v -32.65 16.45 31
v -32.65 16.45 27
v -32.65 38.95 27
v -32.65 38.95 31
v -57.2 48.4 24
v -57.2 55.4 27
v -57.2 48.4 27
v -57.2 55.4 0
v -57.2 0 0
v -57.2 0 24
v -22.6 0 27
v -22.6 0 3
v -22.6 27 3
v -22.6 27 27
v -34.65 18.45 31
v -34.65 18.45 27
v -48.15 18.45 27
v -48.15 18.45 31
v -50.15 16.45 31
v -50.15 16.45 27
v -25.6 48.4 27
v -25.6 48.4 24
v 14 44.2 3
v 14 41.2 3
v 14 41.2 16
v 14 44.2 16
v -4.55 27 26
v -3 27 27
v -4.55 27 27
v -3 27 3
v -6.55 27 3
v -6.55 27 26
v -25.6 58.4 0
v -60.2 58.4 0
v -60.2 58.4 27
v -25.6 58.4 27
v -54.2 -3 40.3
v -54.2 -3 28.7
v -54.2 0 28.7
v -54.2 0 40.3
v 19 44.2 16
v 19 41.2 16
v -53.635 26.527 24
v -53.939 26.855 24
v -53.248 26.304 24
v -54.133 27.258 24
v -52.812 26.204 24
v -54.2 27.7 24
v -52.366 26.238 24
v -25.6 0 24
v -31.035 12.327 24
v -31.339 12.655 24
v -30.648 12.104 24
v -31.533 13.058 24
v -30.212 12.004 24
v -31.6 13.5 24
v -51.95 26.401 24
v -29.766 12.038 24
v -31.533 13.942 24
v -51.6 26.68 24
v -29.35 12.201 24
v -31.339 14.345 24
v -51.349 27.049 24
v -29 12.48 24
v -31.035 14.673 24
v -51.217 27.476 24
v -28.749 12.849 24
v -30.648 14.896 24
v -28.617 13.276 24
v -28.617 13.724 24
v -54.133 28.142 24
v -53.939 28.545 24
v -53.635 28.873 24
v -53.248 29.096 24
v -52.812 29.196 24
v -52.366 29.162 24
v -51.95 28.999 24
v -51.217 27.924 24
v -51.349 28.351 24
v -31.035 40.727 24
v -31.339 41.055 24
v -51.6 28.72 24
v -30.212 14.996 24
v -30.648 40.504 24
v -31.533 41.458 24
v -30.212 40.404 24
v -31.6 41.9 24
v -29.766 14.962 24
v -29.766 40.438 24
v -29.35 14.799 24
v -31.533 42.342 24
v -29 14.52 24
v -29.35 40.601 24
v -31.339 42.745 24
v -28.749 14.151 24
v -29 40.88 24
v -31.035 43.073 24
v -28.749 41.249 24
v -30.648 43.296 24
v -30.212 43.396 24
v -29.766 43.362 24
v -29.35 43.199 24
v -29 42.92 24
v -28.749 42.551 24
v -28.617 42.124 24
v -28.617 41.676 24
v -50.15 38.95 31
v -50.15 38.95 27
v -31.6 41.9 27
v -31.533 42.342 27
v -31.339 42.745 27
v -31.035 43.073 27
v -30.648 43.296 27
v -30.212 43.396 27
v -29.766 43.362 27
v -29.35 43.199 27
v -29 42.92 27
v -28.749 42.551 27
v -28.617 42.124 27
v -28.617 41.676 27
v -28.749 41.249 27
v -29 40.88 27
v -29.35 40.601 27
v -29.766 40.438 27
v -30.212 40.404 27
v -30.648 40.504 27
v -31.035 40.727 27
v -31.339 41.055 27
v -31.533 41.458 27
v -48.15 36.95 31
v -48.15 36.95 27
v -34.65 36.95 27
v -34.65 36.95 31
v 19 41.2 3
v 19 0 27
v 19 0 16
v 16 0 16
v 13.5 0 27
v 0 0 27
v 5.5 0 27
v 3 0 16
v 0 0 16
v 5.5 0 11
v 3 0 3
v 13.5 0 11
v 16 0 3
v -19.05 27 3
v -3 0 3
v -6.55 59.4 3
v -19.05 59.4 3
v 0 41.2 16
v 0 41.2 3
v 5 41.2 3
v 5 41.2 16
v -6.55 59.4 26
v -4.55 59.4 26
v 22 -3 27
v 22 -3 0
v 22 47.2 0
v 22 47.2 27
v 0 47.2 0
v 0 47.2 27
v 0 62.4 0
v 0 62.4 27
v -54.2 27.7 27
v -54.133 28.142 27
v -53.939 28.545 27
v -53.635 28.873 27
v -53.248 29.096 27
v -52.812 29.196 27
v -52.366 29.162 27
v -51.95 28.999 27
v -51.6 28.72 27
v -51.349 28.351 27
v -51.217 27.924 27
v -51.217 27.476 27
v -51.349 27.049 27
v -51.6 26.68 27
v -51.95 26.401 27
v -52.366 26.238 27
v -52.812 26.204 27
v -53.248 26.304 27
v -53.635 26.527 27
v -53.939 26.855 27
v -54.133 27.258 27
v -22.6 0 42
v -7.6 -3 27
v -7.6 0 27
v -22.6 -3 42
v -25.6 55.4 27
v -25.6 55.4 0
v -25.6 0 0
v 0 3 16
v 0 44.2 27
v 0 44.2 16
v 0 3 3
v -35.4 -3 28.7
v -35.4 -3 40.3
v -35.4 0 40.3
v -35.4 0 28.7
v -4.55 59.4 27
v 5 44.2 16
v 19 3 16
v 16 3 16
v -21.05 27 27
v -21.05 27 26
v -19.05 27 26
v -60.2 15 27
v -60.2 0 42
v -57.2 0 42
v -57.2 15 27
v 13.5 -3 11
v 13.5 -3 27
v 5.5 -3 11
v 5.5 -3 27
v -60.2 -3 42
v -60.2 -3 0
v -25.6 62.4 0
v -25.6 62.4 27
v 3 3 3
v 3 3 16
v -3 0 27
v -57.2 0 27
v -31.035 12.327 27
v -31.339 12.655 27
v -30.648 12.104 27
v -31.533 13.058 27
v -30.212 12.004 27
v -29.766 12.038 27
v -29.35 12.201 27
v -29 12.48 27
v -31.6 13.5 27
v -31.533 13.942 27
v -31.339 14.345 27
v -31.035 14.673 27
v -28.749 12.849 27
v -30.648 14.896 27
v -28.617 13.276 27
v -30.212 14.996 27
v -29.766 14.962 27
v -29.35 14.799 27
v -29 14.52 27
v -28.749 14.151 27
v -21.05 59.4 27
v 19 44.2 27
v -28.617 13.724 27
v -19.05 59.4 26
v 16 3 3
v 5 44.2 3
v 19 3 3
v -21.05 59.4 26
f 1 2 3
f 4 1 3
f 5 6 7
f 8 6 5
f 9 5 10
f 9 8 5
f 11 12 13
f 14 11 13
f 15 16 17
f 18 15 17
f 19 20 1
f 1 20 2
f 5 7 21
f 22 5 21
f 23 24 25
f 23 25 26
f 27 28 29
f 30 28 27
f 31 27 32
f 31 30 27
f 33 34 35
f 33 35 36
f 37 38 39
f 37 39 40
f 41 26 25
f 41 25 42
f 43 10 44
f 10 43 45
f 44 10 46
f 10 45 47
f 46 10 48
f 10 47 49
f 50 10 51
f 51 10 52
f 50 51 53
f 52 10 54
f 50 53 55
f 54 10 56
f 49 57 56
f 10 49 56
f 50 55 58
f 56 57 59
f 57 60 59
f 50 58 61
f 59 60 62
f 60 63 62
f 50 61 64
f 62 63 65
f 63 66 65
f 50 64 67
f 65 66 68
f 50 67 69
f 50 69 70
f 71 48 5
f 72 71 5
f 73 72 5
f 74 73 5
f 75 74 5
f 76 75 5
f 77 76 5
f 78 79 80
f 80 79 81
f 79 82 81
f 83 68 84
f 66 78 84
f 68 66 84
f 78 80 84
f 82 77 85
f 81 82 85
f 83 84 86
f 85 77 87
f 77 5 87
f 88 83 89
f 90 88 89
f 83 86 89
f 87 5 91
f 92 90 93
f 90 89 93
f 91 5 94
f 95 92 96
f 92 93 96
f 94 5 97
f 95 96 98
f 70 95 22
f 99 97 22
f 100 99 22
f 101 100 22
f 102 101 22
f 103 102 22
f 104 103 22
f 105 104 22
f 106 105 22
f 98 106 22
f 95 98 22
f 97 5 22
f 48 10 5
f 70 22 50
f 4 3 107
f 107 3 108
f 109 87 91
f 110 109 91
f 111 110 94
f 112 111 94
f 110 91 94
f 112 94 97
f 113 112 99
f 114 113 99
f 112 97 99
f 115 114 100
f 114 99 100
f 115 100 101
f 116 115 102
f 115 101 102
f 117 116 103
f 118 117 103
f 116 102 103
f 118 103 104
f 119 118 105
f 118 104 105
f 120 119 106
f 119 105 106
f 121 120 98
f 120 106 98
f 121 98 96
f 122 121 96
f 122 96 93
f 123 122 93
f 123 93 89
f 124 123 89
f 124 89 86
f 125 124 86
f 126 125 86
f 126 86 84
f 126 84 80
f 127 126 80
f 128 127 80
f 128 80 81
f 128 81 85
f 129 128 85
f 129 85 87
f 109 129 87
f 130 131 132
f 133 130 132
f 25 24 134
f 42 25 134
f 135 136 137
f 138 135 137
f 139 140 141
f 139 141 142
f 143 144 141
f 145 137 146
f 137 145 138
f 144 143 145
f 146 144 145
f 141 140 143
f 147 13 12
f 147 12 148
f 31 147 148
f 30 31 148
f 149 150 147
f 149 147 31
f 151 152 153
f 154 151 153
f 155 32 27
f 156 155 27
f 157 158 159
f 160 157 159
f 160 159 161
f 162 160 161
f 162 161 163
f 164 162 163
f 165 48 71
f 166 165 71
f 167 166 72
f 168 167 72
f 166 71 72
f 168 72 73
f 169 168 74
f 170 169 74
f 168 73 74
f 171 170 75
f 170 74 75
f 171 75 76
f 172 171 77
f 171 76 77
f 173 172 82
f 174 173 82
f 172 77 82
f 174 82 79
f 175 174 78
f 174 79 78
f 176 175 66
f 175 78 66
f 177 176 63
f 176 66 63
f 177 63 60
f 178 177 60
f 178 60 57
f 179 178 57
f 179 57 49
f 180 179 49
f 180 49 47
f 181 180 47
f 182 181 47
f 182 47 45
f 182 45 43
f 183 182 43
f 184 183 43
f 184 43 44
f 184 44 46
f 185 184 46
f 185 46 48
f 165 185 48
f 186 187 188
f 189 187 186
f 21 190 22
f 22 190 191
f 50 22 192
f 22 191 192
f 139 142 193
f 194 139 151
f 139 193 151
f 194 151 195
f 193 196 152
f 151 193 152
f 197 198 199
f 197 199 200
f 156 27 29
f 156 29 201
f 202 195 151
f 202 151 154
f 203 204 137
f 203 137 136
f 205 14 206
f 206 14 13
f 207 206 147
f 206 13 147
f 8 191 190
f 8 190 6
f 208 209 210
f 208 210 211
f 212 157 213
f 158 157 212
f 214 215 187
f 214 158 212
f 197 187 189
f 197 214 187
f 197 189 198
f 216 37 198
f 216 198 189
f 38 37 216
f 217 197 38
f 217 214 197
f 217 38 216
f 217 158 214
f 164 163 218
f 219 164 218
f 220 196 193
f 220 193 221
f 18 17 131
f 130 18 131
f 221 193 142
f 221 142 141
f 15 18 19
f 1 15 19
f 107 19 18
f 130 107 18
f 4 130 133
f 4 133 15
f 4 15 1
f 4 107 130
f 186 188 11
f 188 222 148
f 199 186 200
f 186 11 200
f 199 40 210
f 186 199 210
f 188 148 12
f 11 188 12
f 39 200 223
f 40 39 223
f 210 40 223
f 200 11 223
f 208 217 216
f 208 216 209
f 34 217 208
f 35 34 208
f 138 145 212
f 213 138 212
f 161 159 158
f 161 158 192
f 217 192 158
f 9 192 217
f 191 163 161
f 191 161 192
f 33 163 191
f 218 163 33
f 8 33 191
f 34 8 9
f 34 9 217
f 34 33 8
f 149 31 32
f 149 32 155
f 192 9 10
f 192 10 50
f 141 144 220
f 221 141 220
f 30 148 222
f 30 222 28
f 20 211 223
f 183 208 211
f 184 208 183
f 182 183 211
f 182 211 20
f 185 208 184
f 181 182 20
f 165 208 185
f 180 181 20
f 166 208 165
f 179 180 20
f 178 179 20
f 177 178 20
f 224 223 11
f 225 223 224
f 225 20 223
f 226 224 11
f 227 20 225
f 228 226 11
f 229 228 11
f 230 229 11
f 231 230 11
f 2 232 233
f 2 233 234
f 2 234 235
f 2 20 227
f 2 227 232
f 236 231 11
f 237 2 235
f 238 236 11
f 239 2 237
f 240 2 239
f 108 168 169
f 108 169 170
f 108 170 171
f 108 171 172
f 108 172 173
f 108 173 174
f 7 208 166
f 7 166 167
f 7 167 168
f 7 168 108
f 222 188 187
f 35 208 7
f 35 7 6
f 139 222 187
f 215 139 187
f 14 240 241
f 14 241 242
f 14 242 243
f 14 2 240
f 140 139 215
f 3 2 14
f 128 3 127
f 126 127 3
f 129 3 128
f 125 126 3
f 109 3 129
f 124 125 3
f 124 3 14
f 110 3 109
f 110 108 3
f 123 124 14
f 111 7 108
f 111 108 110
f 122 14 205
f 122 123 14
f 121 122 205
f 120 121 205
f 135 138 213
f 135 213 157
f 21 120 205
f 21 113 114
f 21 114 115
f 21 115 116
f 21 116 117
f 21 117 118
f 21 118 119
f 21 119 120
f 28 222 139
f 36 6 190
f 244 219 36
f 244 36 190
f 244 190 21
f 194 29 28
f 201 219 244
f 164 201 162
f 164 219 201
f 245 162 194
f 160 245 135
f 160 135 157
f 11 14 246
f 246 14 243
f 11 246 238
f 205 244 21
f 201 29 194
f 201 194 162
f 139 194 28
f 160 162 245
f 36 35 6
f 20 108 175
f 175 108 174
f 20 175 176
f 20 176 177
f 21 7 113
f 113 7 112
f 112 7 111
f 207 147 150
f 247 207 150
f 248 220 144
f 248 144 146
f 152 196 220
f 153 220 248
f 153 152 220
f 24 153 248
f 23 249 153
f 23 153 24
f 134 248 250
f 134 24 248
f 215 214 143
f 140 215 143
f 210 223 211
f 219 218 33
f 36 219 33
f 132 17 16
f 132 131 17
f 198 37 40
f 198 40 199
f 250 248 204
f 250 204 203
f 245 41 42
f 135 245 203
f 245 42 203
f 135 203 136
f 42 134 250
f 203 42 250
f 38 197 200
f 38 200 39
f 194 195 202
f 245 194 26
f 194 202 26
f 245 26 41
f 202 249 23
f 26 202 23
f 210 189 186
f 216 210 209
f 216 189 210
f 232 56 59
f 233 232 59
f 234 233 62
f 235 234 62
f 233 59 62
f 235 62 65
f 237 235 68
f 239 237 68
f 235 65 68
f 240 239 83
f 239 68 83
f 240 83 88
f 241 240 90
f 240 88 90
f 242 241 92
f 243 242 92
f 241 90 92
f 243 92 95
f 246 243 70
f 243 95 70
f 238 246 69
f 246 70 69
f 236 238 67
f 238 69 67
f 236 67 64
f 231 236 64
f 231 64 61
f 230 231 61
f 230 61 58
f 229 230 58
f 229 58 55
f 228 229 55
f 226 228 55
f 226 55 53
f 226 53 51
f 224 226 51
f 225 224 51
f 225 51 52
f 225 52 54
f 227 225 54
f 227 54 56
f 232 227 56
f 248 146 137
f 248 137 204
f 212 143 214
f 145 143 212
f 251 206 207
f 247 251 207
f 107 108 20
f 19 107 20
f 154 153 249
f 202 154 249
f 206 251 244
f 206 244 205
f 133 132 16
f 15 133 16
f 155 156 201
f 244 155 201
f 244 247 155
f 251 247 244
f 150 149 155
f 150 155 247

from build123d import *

# Parameters (mm, degrees)
SKETCH1_W            = 2
SKETCH1_H            = 32.4
SKETCH1_W_2          = 5
SKETCH1_H_2          = 3
SKETCH1_W_3          = 3
SKETCH1_W_4          = 8
BOSS_EXTRUDE1_DEPTH  = 3
BOSS_EXTRUDE2_DEPTH  = 27
SKETCH1_4_W          = 5
SKETCH1_4_H          = 3
SKETCH1_4_W_2        = 3
BOSS_EXTRUDE3_DEPTH  = 16
SKETCH1_5_W          = 8
SKETCH1_5_H          = 3
BOSS_EXTRUDE4_DEPTH  = 11
SKETCH1_6_W          = 2
SKETCH1_6_H          = 32.4
BOSS_EXTRUDE5_DEPTH  = 26
BOSS_EXTRUDE6_DEPTH  = 27
SKETCH3_W            = 31.6
SKETCH3_H            = 48.4
BOSS_EXTRUDE7_DEPTH  = 3
BOSS_EXTRUDE8_DEPTH  = 3
BOSS_EXTRUDE9_DEPTH  = 3
SKETCH6_R            = 1.5
CUT_EXTRUDE1_DEPTH   = 10
SKETCH7_W            = 2
SKETCH7_H            = 9.25
BOSS_EXTRUDE10_DEPTH = 4


with BuildPart() as part:
    # Sketch1 → Boss-Extrude1 (new body)
    with BuildSketch(Plane.XY):
        Polygon((3, 0), (0, 0), (-3, 0), (-22.6, 0), (-22.6, 27), (-25.6, 27), (-25.6, -3), (0, -3), (5.5, -3), (5.5, 0), align=None)
        Polygon((0, 62.4), (0, 47.2), (0, 44.2), (0, 41.2), (0, 3), (0, 0), (-3, 0), (-3, 27), (-4.55, 27), (-4.55, 59.4), (-21.05, 59.4), (-21.05, 27), (-22.6, 27), (-25.6, 27), (-25.6, 59.4), (-25.6, 62.4), (-4.55, 62.4), align=None)
        with Locations((-20.05, 43.2)):
            Rectangle(SKETCH1_W, SKETCH1_H)
        Polygon((-22.6, 0), (-3, 0), (-3, 27), (-4.55, 27), (-6.55, 27), (-6.55, 59.4), (-19.05, 59.4), (-19.05, 27), (-21.05, 27), (-22.6, 27), align=None)
        with Locations((2.5, 42.7)):
            Rectangle(SKETCH1_W_2, SKETCH1_H_2)
        Polygon((0, 47.2), (0, 44.2), (5, 44.2), (14, 44.2), (19, 44.2), (19, 41.2), (19, 3), (19, 0), (22, 0), (22, 44.2), (22, 47.2), align=None)
        with Locations((16.5, 42.7)):
            Rectangle(SKETCH1_W_2, SKETCH1_H_2)
        Polygon((3, 3), (3, 0), (5.5, 0), (13.5, 0), (16, 0), (16, 3), (19, 3), (19, 41.2), (14, 41.2), (14, 44.2), (5, 44.2), (5, 41.2), (0, 41.2), (0, 3), align=None)
        with Locations((17.5, 1.5)):
            Rectangle(SKETCH1_W_3, SKETCH1_H_2)
        Polygon((16, 0), (13.5, 0), (13.5, -3), (22, -3), (22, 0), (19, 0), align=None)
        with Locations((1.5, 1.5)):
            Rectangle(SKETCH1_W_3, SKETCH1_H_2)
        with Locations((9.5, -1.5)):
            Rectangle(SKETCH1_W_4, SKETCH1_H_2)
        with Locations((-5.55, 43.2)):
            Rectangle(SKETCH1_W, SKETCH1_H)
    extrude(amount=BOSS_EXTRUDE1_DEPTH)

    # Sketch1<3> → Boss-Extrude2 (add)
    with BuildSketch(Plane.XY):
        Polygon((0, 62.4), (0, 47.2), (0, 44.2), (0, 41.2), (0, 3), (0, 0), (-3, 0), (-3, 27), (-4.55, 27), (-4.55, 59.4), (-21.05, 59.4), (-21.05, 27), (-22.6, 27), (-25.6, 27), (-25.6, 59.4), (-25.6, 62.4), (-4.55, 62.4), align=None)
        Polygon((3, 0), (0, 0), (-3, 0), (-22.6, 0), (-22.6, 27), (-25.6, 27), (-25.6, -3), (0, -3), (5.5, -3), (5.5, 0), align=None)
        Polygon((16, 0), (13.5, 0), (13.5, -3), (22, -3), (22, 0), (19, 0), align=None)
        Polygon((0, 47.2), (0, 44.2), (5, 44.2), (14, 44.2), (19, 44.2), (19, 41.2), (19, 3), (19, 0), (22, 0), (22, 44.2), (22, 47.2), align=None)
    extrude(amount=BOSS_EXTRUDE2_DEPTH)

    # Sketch1<4> → Boss-Extrude3 (add)
    with BuildSketch(Plane.XY):
        with Locations((2.5, 42.7)):
            Rectangle(SKETCH1_4_W, SKETCH1_4_H)
        with Locations((16.5, 42.7)):
            Rectangle(SKETCH1_4_W, SKETCH1_4_H)
        with Locations((17.5, 1.5)):
            Rectangle(SKETCH1_4_W_2, SKETCH1_4_H)
        with Locations((1.5, 1.5)):
            Rectangle(SKETCH1_4_W_2, SKETCH1_4_H)
    extrude(amount=BOSS_EXTRUDE3_DEPTH)

    # Sketch1<5> → Boss-Extrude4 (add)
    with BuildSketch(Plane.XY):
        with Locations((9.5, -1.5)):
            Rectangle(SKETCH1_5_W, SKETCH1_5_H)
    extrude(amount=BOSS_EXTRUDE4_DEPTH)

    # Sketch1<6> → Boss-Extrude5 (add)
    with BuildSketch(Plane.XY):
        with Locations((-5.55, 43.2)):
            Rectangle(SKETCH1_6_W, SKETCH1_6_H)
        with Locations((-20.05, 43.2)):
            Rectangle(SKETCH1_6_W, SKETCH1_6_H)
    extrude(amount=BOSS_EXTRUDE5_DEPTH)

    # Sketch2 → Boss-Extrude6 (add)
    with BuildSketch(Plane(origin=(0, 0, 0), x_dir=(-1, 0, 0), z_dir=(0, 0, -1))):
        Polygon((25.6, 0), (25.6, -3), (60.2, -3), (60.2, 58.4), (25.6, 58.4), (25.6, 55.4), (57.2, 55.4), (57.2, 48.4), (57.2, 0), align=None)
    extrude(amount=-BOSS_EXTRUDE6_DEPTH)

    # Sketch3 → Boss-Extrude7 (add)
    with BuildSketch(Plane.XY.offset(27)):
        with Locations((-41.4, 24.2)):
            Rectangle(SKETCH3_W, SKETCH3_H)
    extrude(amount=-BOSS_EXTRUDE7_DEPTH)

    # Sketch4 → Boss-Extrude8 (add)
    with BuildSketch(Plane(origin=(0, -3, 0), x_dir=(-1, 0, 0), z_dir=(0, -1, 0))):
        Polygon((22.6, -42), (22.6, -27), (7.6, -27), align=None)
        Polygon((53.32802139, -27), (22.6, -27), (22.6, -42), (60.2, -42), (60.2, -32.991669089), (54.2, -32.991669089), (54.2, -40.3), (35.4, -40.3), (35.4, -28.7), (53.32802139, -28.7), align=None)
        Polygon((60.2, -27), (53.32802139, -27), (53.32802139, -28.7), (54.2, -28.7), (54.2, -32.991669089), (60.2, -32.991669089), align=None)
    extrude(amount=-BOSS_EXTRUDE8_DEPTH)

    # Sketch5 → Boss-Extrude9 (add)
    with BuildSketch(Plane.ZY.offset(60.2)):
        Polygon((27, 0), (42, 0), (27, 15), align=None)
    extrude(amount=-BOSS_EXTRUDE9_DEPTH)

    # Sketch6 → Cut-Extrude1 (cut)
    with BuildSketch(Plane(origin=(0, 0, 24), x_dir=(-1, 0, 0), z_dir=(0, 0, -1))):
        with Locations((30.1, 41.9)):
            Circle(SKETCH6_R)
        with Locations((30.1, 13.5)):
            Circle(SKETCH6_R)
        with Locations((52.7, 27.7)):
            Circle(SKETCH6_R)
    extrude(amount=-CUT_EXTRUDE1_DEPTH, mode=Mode.SUBTRACT)

    # Sketch7 → Boss-Extrude10 (add)
    with BuildSketch(Plane.XY.offset(27)):
        Polygon((-50.15, 38.95), (-50.15, 27.7), (-48.15, 27.7), (-48.15, 36.95), (-41.4, 36.95), (-34.65, 36.95), (-34.65, 27.7), (-32.65, 27.7), (-32.65, 36.95), (-32.65, 38.95), (-48.15, 38.95), align=None)
        Polygon((-48.15, 27.7), (-50.15, 27.7), (-50.15, 18.45), (-50.15, 16.45), (-32.65, 16.45), (-32.65, 18.45), (-34.65, 18.45), (-41.4, 18.45), (-48.15, 18.45), align=None)
        with Locations((-33.65, 23.075)):
            Rectangle(SKETCH7_W, SKETCH7_H)
    extrude(amount=BOSS_EXTRUDE10_DEPTH)


solid = part.part
